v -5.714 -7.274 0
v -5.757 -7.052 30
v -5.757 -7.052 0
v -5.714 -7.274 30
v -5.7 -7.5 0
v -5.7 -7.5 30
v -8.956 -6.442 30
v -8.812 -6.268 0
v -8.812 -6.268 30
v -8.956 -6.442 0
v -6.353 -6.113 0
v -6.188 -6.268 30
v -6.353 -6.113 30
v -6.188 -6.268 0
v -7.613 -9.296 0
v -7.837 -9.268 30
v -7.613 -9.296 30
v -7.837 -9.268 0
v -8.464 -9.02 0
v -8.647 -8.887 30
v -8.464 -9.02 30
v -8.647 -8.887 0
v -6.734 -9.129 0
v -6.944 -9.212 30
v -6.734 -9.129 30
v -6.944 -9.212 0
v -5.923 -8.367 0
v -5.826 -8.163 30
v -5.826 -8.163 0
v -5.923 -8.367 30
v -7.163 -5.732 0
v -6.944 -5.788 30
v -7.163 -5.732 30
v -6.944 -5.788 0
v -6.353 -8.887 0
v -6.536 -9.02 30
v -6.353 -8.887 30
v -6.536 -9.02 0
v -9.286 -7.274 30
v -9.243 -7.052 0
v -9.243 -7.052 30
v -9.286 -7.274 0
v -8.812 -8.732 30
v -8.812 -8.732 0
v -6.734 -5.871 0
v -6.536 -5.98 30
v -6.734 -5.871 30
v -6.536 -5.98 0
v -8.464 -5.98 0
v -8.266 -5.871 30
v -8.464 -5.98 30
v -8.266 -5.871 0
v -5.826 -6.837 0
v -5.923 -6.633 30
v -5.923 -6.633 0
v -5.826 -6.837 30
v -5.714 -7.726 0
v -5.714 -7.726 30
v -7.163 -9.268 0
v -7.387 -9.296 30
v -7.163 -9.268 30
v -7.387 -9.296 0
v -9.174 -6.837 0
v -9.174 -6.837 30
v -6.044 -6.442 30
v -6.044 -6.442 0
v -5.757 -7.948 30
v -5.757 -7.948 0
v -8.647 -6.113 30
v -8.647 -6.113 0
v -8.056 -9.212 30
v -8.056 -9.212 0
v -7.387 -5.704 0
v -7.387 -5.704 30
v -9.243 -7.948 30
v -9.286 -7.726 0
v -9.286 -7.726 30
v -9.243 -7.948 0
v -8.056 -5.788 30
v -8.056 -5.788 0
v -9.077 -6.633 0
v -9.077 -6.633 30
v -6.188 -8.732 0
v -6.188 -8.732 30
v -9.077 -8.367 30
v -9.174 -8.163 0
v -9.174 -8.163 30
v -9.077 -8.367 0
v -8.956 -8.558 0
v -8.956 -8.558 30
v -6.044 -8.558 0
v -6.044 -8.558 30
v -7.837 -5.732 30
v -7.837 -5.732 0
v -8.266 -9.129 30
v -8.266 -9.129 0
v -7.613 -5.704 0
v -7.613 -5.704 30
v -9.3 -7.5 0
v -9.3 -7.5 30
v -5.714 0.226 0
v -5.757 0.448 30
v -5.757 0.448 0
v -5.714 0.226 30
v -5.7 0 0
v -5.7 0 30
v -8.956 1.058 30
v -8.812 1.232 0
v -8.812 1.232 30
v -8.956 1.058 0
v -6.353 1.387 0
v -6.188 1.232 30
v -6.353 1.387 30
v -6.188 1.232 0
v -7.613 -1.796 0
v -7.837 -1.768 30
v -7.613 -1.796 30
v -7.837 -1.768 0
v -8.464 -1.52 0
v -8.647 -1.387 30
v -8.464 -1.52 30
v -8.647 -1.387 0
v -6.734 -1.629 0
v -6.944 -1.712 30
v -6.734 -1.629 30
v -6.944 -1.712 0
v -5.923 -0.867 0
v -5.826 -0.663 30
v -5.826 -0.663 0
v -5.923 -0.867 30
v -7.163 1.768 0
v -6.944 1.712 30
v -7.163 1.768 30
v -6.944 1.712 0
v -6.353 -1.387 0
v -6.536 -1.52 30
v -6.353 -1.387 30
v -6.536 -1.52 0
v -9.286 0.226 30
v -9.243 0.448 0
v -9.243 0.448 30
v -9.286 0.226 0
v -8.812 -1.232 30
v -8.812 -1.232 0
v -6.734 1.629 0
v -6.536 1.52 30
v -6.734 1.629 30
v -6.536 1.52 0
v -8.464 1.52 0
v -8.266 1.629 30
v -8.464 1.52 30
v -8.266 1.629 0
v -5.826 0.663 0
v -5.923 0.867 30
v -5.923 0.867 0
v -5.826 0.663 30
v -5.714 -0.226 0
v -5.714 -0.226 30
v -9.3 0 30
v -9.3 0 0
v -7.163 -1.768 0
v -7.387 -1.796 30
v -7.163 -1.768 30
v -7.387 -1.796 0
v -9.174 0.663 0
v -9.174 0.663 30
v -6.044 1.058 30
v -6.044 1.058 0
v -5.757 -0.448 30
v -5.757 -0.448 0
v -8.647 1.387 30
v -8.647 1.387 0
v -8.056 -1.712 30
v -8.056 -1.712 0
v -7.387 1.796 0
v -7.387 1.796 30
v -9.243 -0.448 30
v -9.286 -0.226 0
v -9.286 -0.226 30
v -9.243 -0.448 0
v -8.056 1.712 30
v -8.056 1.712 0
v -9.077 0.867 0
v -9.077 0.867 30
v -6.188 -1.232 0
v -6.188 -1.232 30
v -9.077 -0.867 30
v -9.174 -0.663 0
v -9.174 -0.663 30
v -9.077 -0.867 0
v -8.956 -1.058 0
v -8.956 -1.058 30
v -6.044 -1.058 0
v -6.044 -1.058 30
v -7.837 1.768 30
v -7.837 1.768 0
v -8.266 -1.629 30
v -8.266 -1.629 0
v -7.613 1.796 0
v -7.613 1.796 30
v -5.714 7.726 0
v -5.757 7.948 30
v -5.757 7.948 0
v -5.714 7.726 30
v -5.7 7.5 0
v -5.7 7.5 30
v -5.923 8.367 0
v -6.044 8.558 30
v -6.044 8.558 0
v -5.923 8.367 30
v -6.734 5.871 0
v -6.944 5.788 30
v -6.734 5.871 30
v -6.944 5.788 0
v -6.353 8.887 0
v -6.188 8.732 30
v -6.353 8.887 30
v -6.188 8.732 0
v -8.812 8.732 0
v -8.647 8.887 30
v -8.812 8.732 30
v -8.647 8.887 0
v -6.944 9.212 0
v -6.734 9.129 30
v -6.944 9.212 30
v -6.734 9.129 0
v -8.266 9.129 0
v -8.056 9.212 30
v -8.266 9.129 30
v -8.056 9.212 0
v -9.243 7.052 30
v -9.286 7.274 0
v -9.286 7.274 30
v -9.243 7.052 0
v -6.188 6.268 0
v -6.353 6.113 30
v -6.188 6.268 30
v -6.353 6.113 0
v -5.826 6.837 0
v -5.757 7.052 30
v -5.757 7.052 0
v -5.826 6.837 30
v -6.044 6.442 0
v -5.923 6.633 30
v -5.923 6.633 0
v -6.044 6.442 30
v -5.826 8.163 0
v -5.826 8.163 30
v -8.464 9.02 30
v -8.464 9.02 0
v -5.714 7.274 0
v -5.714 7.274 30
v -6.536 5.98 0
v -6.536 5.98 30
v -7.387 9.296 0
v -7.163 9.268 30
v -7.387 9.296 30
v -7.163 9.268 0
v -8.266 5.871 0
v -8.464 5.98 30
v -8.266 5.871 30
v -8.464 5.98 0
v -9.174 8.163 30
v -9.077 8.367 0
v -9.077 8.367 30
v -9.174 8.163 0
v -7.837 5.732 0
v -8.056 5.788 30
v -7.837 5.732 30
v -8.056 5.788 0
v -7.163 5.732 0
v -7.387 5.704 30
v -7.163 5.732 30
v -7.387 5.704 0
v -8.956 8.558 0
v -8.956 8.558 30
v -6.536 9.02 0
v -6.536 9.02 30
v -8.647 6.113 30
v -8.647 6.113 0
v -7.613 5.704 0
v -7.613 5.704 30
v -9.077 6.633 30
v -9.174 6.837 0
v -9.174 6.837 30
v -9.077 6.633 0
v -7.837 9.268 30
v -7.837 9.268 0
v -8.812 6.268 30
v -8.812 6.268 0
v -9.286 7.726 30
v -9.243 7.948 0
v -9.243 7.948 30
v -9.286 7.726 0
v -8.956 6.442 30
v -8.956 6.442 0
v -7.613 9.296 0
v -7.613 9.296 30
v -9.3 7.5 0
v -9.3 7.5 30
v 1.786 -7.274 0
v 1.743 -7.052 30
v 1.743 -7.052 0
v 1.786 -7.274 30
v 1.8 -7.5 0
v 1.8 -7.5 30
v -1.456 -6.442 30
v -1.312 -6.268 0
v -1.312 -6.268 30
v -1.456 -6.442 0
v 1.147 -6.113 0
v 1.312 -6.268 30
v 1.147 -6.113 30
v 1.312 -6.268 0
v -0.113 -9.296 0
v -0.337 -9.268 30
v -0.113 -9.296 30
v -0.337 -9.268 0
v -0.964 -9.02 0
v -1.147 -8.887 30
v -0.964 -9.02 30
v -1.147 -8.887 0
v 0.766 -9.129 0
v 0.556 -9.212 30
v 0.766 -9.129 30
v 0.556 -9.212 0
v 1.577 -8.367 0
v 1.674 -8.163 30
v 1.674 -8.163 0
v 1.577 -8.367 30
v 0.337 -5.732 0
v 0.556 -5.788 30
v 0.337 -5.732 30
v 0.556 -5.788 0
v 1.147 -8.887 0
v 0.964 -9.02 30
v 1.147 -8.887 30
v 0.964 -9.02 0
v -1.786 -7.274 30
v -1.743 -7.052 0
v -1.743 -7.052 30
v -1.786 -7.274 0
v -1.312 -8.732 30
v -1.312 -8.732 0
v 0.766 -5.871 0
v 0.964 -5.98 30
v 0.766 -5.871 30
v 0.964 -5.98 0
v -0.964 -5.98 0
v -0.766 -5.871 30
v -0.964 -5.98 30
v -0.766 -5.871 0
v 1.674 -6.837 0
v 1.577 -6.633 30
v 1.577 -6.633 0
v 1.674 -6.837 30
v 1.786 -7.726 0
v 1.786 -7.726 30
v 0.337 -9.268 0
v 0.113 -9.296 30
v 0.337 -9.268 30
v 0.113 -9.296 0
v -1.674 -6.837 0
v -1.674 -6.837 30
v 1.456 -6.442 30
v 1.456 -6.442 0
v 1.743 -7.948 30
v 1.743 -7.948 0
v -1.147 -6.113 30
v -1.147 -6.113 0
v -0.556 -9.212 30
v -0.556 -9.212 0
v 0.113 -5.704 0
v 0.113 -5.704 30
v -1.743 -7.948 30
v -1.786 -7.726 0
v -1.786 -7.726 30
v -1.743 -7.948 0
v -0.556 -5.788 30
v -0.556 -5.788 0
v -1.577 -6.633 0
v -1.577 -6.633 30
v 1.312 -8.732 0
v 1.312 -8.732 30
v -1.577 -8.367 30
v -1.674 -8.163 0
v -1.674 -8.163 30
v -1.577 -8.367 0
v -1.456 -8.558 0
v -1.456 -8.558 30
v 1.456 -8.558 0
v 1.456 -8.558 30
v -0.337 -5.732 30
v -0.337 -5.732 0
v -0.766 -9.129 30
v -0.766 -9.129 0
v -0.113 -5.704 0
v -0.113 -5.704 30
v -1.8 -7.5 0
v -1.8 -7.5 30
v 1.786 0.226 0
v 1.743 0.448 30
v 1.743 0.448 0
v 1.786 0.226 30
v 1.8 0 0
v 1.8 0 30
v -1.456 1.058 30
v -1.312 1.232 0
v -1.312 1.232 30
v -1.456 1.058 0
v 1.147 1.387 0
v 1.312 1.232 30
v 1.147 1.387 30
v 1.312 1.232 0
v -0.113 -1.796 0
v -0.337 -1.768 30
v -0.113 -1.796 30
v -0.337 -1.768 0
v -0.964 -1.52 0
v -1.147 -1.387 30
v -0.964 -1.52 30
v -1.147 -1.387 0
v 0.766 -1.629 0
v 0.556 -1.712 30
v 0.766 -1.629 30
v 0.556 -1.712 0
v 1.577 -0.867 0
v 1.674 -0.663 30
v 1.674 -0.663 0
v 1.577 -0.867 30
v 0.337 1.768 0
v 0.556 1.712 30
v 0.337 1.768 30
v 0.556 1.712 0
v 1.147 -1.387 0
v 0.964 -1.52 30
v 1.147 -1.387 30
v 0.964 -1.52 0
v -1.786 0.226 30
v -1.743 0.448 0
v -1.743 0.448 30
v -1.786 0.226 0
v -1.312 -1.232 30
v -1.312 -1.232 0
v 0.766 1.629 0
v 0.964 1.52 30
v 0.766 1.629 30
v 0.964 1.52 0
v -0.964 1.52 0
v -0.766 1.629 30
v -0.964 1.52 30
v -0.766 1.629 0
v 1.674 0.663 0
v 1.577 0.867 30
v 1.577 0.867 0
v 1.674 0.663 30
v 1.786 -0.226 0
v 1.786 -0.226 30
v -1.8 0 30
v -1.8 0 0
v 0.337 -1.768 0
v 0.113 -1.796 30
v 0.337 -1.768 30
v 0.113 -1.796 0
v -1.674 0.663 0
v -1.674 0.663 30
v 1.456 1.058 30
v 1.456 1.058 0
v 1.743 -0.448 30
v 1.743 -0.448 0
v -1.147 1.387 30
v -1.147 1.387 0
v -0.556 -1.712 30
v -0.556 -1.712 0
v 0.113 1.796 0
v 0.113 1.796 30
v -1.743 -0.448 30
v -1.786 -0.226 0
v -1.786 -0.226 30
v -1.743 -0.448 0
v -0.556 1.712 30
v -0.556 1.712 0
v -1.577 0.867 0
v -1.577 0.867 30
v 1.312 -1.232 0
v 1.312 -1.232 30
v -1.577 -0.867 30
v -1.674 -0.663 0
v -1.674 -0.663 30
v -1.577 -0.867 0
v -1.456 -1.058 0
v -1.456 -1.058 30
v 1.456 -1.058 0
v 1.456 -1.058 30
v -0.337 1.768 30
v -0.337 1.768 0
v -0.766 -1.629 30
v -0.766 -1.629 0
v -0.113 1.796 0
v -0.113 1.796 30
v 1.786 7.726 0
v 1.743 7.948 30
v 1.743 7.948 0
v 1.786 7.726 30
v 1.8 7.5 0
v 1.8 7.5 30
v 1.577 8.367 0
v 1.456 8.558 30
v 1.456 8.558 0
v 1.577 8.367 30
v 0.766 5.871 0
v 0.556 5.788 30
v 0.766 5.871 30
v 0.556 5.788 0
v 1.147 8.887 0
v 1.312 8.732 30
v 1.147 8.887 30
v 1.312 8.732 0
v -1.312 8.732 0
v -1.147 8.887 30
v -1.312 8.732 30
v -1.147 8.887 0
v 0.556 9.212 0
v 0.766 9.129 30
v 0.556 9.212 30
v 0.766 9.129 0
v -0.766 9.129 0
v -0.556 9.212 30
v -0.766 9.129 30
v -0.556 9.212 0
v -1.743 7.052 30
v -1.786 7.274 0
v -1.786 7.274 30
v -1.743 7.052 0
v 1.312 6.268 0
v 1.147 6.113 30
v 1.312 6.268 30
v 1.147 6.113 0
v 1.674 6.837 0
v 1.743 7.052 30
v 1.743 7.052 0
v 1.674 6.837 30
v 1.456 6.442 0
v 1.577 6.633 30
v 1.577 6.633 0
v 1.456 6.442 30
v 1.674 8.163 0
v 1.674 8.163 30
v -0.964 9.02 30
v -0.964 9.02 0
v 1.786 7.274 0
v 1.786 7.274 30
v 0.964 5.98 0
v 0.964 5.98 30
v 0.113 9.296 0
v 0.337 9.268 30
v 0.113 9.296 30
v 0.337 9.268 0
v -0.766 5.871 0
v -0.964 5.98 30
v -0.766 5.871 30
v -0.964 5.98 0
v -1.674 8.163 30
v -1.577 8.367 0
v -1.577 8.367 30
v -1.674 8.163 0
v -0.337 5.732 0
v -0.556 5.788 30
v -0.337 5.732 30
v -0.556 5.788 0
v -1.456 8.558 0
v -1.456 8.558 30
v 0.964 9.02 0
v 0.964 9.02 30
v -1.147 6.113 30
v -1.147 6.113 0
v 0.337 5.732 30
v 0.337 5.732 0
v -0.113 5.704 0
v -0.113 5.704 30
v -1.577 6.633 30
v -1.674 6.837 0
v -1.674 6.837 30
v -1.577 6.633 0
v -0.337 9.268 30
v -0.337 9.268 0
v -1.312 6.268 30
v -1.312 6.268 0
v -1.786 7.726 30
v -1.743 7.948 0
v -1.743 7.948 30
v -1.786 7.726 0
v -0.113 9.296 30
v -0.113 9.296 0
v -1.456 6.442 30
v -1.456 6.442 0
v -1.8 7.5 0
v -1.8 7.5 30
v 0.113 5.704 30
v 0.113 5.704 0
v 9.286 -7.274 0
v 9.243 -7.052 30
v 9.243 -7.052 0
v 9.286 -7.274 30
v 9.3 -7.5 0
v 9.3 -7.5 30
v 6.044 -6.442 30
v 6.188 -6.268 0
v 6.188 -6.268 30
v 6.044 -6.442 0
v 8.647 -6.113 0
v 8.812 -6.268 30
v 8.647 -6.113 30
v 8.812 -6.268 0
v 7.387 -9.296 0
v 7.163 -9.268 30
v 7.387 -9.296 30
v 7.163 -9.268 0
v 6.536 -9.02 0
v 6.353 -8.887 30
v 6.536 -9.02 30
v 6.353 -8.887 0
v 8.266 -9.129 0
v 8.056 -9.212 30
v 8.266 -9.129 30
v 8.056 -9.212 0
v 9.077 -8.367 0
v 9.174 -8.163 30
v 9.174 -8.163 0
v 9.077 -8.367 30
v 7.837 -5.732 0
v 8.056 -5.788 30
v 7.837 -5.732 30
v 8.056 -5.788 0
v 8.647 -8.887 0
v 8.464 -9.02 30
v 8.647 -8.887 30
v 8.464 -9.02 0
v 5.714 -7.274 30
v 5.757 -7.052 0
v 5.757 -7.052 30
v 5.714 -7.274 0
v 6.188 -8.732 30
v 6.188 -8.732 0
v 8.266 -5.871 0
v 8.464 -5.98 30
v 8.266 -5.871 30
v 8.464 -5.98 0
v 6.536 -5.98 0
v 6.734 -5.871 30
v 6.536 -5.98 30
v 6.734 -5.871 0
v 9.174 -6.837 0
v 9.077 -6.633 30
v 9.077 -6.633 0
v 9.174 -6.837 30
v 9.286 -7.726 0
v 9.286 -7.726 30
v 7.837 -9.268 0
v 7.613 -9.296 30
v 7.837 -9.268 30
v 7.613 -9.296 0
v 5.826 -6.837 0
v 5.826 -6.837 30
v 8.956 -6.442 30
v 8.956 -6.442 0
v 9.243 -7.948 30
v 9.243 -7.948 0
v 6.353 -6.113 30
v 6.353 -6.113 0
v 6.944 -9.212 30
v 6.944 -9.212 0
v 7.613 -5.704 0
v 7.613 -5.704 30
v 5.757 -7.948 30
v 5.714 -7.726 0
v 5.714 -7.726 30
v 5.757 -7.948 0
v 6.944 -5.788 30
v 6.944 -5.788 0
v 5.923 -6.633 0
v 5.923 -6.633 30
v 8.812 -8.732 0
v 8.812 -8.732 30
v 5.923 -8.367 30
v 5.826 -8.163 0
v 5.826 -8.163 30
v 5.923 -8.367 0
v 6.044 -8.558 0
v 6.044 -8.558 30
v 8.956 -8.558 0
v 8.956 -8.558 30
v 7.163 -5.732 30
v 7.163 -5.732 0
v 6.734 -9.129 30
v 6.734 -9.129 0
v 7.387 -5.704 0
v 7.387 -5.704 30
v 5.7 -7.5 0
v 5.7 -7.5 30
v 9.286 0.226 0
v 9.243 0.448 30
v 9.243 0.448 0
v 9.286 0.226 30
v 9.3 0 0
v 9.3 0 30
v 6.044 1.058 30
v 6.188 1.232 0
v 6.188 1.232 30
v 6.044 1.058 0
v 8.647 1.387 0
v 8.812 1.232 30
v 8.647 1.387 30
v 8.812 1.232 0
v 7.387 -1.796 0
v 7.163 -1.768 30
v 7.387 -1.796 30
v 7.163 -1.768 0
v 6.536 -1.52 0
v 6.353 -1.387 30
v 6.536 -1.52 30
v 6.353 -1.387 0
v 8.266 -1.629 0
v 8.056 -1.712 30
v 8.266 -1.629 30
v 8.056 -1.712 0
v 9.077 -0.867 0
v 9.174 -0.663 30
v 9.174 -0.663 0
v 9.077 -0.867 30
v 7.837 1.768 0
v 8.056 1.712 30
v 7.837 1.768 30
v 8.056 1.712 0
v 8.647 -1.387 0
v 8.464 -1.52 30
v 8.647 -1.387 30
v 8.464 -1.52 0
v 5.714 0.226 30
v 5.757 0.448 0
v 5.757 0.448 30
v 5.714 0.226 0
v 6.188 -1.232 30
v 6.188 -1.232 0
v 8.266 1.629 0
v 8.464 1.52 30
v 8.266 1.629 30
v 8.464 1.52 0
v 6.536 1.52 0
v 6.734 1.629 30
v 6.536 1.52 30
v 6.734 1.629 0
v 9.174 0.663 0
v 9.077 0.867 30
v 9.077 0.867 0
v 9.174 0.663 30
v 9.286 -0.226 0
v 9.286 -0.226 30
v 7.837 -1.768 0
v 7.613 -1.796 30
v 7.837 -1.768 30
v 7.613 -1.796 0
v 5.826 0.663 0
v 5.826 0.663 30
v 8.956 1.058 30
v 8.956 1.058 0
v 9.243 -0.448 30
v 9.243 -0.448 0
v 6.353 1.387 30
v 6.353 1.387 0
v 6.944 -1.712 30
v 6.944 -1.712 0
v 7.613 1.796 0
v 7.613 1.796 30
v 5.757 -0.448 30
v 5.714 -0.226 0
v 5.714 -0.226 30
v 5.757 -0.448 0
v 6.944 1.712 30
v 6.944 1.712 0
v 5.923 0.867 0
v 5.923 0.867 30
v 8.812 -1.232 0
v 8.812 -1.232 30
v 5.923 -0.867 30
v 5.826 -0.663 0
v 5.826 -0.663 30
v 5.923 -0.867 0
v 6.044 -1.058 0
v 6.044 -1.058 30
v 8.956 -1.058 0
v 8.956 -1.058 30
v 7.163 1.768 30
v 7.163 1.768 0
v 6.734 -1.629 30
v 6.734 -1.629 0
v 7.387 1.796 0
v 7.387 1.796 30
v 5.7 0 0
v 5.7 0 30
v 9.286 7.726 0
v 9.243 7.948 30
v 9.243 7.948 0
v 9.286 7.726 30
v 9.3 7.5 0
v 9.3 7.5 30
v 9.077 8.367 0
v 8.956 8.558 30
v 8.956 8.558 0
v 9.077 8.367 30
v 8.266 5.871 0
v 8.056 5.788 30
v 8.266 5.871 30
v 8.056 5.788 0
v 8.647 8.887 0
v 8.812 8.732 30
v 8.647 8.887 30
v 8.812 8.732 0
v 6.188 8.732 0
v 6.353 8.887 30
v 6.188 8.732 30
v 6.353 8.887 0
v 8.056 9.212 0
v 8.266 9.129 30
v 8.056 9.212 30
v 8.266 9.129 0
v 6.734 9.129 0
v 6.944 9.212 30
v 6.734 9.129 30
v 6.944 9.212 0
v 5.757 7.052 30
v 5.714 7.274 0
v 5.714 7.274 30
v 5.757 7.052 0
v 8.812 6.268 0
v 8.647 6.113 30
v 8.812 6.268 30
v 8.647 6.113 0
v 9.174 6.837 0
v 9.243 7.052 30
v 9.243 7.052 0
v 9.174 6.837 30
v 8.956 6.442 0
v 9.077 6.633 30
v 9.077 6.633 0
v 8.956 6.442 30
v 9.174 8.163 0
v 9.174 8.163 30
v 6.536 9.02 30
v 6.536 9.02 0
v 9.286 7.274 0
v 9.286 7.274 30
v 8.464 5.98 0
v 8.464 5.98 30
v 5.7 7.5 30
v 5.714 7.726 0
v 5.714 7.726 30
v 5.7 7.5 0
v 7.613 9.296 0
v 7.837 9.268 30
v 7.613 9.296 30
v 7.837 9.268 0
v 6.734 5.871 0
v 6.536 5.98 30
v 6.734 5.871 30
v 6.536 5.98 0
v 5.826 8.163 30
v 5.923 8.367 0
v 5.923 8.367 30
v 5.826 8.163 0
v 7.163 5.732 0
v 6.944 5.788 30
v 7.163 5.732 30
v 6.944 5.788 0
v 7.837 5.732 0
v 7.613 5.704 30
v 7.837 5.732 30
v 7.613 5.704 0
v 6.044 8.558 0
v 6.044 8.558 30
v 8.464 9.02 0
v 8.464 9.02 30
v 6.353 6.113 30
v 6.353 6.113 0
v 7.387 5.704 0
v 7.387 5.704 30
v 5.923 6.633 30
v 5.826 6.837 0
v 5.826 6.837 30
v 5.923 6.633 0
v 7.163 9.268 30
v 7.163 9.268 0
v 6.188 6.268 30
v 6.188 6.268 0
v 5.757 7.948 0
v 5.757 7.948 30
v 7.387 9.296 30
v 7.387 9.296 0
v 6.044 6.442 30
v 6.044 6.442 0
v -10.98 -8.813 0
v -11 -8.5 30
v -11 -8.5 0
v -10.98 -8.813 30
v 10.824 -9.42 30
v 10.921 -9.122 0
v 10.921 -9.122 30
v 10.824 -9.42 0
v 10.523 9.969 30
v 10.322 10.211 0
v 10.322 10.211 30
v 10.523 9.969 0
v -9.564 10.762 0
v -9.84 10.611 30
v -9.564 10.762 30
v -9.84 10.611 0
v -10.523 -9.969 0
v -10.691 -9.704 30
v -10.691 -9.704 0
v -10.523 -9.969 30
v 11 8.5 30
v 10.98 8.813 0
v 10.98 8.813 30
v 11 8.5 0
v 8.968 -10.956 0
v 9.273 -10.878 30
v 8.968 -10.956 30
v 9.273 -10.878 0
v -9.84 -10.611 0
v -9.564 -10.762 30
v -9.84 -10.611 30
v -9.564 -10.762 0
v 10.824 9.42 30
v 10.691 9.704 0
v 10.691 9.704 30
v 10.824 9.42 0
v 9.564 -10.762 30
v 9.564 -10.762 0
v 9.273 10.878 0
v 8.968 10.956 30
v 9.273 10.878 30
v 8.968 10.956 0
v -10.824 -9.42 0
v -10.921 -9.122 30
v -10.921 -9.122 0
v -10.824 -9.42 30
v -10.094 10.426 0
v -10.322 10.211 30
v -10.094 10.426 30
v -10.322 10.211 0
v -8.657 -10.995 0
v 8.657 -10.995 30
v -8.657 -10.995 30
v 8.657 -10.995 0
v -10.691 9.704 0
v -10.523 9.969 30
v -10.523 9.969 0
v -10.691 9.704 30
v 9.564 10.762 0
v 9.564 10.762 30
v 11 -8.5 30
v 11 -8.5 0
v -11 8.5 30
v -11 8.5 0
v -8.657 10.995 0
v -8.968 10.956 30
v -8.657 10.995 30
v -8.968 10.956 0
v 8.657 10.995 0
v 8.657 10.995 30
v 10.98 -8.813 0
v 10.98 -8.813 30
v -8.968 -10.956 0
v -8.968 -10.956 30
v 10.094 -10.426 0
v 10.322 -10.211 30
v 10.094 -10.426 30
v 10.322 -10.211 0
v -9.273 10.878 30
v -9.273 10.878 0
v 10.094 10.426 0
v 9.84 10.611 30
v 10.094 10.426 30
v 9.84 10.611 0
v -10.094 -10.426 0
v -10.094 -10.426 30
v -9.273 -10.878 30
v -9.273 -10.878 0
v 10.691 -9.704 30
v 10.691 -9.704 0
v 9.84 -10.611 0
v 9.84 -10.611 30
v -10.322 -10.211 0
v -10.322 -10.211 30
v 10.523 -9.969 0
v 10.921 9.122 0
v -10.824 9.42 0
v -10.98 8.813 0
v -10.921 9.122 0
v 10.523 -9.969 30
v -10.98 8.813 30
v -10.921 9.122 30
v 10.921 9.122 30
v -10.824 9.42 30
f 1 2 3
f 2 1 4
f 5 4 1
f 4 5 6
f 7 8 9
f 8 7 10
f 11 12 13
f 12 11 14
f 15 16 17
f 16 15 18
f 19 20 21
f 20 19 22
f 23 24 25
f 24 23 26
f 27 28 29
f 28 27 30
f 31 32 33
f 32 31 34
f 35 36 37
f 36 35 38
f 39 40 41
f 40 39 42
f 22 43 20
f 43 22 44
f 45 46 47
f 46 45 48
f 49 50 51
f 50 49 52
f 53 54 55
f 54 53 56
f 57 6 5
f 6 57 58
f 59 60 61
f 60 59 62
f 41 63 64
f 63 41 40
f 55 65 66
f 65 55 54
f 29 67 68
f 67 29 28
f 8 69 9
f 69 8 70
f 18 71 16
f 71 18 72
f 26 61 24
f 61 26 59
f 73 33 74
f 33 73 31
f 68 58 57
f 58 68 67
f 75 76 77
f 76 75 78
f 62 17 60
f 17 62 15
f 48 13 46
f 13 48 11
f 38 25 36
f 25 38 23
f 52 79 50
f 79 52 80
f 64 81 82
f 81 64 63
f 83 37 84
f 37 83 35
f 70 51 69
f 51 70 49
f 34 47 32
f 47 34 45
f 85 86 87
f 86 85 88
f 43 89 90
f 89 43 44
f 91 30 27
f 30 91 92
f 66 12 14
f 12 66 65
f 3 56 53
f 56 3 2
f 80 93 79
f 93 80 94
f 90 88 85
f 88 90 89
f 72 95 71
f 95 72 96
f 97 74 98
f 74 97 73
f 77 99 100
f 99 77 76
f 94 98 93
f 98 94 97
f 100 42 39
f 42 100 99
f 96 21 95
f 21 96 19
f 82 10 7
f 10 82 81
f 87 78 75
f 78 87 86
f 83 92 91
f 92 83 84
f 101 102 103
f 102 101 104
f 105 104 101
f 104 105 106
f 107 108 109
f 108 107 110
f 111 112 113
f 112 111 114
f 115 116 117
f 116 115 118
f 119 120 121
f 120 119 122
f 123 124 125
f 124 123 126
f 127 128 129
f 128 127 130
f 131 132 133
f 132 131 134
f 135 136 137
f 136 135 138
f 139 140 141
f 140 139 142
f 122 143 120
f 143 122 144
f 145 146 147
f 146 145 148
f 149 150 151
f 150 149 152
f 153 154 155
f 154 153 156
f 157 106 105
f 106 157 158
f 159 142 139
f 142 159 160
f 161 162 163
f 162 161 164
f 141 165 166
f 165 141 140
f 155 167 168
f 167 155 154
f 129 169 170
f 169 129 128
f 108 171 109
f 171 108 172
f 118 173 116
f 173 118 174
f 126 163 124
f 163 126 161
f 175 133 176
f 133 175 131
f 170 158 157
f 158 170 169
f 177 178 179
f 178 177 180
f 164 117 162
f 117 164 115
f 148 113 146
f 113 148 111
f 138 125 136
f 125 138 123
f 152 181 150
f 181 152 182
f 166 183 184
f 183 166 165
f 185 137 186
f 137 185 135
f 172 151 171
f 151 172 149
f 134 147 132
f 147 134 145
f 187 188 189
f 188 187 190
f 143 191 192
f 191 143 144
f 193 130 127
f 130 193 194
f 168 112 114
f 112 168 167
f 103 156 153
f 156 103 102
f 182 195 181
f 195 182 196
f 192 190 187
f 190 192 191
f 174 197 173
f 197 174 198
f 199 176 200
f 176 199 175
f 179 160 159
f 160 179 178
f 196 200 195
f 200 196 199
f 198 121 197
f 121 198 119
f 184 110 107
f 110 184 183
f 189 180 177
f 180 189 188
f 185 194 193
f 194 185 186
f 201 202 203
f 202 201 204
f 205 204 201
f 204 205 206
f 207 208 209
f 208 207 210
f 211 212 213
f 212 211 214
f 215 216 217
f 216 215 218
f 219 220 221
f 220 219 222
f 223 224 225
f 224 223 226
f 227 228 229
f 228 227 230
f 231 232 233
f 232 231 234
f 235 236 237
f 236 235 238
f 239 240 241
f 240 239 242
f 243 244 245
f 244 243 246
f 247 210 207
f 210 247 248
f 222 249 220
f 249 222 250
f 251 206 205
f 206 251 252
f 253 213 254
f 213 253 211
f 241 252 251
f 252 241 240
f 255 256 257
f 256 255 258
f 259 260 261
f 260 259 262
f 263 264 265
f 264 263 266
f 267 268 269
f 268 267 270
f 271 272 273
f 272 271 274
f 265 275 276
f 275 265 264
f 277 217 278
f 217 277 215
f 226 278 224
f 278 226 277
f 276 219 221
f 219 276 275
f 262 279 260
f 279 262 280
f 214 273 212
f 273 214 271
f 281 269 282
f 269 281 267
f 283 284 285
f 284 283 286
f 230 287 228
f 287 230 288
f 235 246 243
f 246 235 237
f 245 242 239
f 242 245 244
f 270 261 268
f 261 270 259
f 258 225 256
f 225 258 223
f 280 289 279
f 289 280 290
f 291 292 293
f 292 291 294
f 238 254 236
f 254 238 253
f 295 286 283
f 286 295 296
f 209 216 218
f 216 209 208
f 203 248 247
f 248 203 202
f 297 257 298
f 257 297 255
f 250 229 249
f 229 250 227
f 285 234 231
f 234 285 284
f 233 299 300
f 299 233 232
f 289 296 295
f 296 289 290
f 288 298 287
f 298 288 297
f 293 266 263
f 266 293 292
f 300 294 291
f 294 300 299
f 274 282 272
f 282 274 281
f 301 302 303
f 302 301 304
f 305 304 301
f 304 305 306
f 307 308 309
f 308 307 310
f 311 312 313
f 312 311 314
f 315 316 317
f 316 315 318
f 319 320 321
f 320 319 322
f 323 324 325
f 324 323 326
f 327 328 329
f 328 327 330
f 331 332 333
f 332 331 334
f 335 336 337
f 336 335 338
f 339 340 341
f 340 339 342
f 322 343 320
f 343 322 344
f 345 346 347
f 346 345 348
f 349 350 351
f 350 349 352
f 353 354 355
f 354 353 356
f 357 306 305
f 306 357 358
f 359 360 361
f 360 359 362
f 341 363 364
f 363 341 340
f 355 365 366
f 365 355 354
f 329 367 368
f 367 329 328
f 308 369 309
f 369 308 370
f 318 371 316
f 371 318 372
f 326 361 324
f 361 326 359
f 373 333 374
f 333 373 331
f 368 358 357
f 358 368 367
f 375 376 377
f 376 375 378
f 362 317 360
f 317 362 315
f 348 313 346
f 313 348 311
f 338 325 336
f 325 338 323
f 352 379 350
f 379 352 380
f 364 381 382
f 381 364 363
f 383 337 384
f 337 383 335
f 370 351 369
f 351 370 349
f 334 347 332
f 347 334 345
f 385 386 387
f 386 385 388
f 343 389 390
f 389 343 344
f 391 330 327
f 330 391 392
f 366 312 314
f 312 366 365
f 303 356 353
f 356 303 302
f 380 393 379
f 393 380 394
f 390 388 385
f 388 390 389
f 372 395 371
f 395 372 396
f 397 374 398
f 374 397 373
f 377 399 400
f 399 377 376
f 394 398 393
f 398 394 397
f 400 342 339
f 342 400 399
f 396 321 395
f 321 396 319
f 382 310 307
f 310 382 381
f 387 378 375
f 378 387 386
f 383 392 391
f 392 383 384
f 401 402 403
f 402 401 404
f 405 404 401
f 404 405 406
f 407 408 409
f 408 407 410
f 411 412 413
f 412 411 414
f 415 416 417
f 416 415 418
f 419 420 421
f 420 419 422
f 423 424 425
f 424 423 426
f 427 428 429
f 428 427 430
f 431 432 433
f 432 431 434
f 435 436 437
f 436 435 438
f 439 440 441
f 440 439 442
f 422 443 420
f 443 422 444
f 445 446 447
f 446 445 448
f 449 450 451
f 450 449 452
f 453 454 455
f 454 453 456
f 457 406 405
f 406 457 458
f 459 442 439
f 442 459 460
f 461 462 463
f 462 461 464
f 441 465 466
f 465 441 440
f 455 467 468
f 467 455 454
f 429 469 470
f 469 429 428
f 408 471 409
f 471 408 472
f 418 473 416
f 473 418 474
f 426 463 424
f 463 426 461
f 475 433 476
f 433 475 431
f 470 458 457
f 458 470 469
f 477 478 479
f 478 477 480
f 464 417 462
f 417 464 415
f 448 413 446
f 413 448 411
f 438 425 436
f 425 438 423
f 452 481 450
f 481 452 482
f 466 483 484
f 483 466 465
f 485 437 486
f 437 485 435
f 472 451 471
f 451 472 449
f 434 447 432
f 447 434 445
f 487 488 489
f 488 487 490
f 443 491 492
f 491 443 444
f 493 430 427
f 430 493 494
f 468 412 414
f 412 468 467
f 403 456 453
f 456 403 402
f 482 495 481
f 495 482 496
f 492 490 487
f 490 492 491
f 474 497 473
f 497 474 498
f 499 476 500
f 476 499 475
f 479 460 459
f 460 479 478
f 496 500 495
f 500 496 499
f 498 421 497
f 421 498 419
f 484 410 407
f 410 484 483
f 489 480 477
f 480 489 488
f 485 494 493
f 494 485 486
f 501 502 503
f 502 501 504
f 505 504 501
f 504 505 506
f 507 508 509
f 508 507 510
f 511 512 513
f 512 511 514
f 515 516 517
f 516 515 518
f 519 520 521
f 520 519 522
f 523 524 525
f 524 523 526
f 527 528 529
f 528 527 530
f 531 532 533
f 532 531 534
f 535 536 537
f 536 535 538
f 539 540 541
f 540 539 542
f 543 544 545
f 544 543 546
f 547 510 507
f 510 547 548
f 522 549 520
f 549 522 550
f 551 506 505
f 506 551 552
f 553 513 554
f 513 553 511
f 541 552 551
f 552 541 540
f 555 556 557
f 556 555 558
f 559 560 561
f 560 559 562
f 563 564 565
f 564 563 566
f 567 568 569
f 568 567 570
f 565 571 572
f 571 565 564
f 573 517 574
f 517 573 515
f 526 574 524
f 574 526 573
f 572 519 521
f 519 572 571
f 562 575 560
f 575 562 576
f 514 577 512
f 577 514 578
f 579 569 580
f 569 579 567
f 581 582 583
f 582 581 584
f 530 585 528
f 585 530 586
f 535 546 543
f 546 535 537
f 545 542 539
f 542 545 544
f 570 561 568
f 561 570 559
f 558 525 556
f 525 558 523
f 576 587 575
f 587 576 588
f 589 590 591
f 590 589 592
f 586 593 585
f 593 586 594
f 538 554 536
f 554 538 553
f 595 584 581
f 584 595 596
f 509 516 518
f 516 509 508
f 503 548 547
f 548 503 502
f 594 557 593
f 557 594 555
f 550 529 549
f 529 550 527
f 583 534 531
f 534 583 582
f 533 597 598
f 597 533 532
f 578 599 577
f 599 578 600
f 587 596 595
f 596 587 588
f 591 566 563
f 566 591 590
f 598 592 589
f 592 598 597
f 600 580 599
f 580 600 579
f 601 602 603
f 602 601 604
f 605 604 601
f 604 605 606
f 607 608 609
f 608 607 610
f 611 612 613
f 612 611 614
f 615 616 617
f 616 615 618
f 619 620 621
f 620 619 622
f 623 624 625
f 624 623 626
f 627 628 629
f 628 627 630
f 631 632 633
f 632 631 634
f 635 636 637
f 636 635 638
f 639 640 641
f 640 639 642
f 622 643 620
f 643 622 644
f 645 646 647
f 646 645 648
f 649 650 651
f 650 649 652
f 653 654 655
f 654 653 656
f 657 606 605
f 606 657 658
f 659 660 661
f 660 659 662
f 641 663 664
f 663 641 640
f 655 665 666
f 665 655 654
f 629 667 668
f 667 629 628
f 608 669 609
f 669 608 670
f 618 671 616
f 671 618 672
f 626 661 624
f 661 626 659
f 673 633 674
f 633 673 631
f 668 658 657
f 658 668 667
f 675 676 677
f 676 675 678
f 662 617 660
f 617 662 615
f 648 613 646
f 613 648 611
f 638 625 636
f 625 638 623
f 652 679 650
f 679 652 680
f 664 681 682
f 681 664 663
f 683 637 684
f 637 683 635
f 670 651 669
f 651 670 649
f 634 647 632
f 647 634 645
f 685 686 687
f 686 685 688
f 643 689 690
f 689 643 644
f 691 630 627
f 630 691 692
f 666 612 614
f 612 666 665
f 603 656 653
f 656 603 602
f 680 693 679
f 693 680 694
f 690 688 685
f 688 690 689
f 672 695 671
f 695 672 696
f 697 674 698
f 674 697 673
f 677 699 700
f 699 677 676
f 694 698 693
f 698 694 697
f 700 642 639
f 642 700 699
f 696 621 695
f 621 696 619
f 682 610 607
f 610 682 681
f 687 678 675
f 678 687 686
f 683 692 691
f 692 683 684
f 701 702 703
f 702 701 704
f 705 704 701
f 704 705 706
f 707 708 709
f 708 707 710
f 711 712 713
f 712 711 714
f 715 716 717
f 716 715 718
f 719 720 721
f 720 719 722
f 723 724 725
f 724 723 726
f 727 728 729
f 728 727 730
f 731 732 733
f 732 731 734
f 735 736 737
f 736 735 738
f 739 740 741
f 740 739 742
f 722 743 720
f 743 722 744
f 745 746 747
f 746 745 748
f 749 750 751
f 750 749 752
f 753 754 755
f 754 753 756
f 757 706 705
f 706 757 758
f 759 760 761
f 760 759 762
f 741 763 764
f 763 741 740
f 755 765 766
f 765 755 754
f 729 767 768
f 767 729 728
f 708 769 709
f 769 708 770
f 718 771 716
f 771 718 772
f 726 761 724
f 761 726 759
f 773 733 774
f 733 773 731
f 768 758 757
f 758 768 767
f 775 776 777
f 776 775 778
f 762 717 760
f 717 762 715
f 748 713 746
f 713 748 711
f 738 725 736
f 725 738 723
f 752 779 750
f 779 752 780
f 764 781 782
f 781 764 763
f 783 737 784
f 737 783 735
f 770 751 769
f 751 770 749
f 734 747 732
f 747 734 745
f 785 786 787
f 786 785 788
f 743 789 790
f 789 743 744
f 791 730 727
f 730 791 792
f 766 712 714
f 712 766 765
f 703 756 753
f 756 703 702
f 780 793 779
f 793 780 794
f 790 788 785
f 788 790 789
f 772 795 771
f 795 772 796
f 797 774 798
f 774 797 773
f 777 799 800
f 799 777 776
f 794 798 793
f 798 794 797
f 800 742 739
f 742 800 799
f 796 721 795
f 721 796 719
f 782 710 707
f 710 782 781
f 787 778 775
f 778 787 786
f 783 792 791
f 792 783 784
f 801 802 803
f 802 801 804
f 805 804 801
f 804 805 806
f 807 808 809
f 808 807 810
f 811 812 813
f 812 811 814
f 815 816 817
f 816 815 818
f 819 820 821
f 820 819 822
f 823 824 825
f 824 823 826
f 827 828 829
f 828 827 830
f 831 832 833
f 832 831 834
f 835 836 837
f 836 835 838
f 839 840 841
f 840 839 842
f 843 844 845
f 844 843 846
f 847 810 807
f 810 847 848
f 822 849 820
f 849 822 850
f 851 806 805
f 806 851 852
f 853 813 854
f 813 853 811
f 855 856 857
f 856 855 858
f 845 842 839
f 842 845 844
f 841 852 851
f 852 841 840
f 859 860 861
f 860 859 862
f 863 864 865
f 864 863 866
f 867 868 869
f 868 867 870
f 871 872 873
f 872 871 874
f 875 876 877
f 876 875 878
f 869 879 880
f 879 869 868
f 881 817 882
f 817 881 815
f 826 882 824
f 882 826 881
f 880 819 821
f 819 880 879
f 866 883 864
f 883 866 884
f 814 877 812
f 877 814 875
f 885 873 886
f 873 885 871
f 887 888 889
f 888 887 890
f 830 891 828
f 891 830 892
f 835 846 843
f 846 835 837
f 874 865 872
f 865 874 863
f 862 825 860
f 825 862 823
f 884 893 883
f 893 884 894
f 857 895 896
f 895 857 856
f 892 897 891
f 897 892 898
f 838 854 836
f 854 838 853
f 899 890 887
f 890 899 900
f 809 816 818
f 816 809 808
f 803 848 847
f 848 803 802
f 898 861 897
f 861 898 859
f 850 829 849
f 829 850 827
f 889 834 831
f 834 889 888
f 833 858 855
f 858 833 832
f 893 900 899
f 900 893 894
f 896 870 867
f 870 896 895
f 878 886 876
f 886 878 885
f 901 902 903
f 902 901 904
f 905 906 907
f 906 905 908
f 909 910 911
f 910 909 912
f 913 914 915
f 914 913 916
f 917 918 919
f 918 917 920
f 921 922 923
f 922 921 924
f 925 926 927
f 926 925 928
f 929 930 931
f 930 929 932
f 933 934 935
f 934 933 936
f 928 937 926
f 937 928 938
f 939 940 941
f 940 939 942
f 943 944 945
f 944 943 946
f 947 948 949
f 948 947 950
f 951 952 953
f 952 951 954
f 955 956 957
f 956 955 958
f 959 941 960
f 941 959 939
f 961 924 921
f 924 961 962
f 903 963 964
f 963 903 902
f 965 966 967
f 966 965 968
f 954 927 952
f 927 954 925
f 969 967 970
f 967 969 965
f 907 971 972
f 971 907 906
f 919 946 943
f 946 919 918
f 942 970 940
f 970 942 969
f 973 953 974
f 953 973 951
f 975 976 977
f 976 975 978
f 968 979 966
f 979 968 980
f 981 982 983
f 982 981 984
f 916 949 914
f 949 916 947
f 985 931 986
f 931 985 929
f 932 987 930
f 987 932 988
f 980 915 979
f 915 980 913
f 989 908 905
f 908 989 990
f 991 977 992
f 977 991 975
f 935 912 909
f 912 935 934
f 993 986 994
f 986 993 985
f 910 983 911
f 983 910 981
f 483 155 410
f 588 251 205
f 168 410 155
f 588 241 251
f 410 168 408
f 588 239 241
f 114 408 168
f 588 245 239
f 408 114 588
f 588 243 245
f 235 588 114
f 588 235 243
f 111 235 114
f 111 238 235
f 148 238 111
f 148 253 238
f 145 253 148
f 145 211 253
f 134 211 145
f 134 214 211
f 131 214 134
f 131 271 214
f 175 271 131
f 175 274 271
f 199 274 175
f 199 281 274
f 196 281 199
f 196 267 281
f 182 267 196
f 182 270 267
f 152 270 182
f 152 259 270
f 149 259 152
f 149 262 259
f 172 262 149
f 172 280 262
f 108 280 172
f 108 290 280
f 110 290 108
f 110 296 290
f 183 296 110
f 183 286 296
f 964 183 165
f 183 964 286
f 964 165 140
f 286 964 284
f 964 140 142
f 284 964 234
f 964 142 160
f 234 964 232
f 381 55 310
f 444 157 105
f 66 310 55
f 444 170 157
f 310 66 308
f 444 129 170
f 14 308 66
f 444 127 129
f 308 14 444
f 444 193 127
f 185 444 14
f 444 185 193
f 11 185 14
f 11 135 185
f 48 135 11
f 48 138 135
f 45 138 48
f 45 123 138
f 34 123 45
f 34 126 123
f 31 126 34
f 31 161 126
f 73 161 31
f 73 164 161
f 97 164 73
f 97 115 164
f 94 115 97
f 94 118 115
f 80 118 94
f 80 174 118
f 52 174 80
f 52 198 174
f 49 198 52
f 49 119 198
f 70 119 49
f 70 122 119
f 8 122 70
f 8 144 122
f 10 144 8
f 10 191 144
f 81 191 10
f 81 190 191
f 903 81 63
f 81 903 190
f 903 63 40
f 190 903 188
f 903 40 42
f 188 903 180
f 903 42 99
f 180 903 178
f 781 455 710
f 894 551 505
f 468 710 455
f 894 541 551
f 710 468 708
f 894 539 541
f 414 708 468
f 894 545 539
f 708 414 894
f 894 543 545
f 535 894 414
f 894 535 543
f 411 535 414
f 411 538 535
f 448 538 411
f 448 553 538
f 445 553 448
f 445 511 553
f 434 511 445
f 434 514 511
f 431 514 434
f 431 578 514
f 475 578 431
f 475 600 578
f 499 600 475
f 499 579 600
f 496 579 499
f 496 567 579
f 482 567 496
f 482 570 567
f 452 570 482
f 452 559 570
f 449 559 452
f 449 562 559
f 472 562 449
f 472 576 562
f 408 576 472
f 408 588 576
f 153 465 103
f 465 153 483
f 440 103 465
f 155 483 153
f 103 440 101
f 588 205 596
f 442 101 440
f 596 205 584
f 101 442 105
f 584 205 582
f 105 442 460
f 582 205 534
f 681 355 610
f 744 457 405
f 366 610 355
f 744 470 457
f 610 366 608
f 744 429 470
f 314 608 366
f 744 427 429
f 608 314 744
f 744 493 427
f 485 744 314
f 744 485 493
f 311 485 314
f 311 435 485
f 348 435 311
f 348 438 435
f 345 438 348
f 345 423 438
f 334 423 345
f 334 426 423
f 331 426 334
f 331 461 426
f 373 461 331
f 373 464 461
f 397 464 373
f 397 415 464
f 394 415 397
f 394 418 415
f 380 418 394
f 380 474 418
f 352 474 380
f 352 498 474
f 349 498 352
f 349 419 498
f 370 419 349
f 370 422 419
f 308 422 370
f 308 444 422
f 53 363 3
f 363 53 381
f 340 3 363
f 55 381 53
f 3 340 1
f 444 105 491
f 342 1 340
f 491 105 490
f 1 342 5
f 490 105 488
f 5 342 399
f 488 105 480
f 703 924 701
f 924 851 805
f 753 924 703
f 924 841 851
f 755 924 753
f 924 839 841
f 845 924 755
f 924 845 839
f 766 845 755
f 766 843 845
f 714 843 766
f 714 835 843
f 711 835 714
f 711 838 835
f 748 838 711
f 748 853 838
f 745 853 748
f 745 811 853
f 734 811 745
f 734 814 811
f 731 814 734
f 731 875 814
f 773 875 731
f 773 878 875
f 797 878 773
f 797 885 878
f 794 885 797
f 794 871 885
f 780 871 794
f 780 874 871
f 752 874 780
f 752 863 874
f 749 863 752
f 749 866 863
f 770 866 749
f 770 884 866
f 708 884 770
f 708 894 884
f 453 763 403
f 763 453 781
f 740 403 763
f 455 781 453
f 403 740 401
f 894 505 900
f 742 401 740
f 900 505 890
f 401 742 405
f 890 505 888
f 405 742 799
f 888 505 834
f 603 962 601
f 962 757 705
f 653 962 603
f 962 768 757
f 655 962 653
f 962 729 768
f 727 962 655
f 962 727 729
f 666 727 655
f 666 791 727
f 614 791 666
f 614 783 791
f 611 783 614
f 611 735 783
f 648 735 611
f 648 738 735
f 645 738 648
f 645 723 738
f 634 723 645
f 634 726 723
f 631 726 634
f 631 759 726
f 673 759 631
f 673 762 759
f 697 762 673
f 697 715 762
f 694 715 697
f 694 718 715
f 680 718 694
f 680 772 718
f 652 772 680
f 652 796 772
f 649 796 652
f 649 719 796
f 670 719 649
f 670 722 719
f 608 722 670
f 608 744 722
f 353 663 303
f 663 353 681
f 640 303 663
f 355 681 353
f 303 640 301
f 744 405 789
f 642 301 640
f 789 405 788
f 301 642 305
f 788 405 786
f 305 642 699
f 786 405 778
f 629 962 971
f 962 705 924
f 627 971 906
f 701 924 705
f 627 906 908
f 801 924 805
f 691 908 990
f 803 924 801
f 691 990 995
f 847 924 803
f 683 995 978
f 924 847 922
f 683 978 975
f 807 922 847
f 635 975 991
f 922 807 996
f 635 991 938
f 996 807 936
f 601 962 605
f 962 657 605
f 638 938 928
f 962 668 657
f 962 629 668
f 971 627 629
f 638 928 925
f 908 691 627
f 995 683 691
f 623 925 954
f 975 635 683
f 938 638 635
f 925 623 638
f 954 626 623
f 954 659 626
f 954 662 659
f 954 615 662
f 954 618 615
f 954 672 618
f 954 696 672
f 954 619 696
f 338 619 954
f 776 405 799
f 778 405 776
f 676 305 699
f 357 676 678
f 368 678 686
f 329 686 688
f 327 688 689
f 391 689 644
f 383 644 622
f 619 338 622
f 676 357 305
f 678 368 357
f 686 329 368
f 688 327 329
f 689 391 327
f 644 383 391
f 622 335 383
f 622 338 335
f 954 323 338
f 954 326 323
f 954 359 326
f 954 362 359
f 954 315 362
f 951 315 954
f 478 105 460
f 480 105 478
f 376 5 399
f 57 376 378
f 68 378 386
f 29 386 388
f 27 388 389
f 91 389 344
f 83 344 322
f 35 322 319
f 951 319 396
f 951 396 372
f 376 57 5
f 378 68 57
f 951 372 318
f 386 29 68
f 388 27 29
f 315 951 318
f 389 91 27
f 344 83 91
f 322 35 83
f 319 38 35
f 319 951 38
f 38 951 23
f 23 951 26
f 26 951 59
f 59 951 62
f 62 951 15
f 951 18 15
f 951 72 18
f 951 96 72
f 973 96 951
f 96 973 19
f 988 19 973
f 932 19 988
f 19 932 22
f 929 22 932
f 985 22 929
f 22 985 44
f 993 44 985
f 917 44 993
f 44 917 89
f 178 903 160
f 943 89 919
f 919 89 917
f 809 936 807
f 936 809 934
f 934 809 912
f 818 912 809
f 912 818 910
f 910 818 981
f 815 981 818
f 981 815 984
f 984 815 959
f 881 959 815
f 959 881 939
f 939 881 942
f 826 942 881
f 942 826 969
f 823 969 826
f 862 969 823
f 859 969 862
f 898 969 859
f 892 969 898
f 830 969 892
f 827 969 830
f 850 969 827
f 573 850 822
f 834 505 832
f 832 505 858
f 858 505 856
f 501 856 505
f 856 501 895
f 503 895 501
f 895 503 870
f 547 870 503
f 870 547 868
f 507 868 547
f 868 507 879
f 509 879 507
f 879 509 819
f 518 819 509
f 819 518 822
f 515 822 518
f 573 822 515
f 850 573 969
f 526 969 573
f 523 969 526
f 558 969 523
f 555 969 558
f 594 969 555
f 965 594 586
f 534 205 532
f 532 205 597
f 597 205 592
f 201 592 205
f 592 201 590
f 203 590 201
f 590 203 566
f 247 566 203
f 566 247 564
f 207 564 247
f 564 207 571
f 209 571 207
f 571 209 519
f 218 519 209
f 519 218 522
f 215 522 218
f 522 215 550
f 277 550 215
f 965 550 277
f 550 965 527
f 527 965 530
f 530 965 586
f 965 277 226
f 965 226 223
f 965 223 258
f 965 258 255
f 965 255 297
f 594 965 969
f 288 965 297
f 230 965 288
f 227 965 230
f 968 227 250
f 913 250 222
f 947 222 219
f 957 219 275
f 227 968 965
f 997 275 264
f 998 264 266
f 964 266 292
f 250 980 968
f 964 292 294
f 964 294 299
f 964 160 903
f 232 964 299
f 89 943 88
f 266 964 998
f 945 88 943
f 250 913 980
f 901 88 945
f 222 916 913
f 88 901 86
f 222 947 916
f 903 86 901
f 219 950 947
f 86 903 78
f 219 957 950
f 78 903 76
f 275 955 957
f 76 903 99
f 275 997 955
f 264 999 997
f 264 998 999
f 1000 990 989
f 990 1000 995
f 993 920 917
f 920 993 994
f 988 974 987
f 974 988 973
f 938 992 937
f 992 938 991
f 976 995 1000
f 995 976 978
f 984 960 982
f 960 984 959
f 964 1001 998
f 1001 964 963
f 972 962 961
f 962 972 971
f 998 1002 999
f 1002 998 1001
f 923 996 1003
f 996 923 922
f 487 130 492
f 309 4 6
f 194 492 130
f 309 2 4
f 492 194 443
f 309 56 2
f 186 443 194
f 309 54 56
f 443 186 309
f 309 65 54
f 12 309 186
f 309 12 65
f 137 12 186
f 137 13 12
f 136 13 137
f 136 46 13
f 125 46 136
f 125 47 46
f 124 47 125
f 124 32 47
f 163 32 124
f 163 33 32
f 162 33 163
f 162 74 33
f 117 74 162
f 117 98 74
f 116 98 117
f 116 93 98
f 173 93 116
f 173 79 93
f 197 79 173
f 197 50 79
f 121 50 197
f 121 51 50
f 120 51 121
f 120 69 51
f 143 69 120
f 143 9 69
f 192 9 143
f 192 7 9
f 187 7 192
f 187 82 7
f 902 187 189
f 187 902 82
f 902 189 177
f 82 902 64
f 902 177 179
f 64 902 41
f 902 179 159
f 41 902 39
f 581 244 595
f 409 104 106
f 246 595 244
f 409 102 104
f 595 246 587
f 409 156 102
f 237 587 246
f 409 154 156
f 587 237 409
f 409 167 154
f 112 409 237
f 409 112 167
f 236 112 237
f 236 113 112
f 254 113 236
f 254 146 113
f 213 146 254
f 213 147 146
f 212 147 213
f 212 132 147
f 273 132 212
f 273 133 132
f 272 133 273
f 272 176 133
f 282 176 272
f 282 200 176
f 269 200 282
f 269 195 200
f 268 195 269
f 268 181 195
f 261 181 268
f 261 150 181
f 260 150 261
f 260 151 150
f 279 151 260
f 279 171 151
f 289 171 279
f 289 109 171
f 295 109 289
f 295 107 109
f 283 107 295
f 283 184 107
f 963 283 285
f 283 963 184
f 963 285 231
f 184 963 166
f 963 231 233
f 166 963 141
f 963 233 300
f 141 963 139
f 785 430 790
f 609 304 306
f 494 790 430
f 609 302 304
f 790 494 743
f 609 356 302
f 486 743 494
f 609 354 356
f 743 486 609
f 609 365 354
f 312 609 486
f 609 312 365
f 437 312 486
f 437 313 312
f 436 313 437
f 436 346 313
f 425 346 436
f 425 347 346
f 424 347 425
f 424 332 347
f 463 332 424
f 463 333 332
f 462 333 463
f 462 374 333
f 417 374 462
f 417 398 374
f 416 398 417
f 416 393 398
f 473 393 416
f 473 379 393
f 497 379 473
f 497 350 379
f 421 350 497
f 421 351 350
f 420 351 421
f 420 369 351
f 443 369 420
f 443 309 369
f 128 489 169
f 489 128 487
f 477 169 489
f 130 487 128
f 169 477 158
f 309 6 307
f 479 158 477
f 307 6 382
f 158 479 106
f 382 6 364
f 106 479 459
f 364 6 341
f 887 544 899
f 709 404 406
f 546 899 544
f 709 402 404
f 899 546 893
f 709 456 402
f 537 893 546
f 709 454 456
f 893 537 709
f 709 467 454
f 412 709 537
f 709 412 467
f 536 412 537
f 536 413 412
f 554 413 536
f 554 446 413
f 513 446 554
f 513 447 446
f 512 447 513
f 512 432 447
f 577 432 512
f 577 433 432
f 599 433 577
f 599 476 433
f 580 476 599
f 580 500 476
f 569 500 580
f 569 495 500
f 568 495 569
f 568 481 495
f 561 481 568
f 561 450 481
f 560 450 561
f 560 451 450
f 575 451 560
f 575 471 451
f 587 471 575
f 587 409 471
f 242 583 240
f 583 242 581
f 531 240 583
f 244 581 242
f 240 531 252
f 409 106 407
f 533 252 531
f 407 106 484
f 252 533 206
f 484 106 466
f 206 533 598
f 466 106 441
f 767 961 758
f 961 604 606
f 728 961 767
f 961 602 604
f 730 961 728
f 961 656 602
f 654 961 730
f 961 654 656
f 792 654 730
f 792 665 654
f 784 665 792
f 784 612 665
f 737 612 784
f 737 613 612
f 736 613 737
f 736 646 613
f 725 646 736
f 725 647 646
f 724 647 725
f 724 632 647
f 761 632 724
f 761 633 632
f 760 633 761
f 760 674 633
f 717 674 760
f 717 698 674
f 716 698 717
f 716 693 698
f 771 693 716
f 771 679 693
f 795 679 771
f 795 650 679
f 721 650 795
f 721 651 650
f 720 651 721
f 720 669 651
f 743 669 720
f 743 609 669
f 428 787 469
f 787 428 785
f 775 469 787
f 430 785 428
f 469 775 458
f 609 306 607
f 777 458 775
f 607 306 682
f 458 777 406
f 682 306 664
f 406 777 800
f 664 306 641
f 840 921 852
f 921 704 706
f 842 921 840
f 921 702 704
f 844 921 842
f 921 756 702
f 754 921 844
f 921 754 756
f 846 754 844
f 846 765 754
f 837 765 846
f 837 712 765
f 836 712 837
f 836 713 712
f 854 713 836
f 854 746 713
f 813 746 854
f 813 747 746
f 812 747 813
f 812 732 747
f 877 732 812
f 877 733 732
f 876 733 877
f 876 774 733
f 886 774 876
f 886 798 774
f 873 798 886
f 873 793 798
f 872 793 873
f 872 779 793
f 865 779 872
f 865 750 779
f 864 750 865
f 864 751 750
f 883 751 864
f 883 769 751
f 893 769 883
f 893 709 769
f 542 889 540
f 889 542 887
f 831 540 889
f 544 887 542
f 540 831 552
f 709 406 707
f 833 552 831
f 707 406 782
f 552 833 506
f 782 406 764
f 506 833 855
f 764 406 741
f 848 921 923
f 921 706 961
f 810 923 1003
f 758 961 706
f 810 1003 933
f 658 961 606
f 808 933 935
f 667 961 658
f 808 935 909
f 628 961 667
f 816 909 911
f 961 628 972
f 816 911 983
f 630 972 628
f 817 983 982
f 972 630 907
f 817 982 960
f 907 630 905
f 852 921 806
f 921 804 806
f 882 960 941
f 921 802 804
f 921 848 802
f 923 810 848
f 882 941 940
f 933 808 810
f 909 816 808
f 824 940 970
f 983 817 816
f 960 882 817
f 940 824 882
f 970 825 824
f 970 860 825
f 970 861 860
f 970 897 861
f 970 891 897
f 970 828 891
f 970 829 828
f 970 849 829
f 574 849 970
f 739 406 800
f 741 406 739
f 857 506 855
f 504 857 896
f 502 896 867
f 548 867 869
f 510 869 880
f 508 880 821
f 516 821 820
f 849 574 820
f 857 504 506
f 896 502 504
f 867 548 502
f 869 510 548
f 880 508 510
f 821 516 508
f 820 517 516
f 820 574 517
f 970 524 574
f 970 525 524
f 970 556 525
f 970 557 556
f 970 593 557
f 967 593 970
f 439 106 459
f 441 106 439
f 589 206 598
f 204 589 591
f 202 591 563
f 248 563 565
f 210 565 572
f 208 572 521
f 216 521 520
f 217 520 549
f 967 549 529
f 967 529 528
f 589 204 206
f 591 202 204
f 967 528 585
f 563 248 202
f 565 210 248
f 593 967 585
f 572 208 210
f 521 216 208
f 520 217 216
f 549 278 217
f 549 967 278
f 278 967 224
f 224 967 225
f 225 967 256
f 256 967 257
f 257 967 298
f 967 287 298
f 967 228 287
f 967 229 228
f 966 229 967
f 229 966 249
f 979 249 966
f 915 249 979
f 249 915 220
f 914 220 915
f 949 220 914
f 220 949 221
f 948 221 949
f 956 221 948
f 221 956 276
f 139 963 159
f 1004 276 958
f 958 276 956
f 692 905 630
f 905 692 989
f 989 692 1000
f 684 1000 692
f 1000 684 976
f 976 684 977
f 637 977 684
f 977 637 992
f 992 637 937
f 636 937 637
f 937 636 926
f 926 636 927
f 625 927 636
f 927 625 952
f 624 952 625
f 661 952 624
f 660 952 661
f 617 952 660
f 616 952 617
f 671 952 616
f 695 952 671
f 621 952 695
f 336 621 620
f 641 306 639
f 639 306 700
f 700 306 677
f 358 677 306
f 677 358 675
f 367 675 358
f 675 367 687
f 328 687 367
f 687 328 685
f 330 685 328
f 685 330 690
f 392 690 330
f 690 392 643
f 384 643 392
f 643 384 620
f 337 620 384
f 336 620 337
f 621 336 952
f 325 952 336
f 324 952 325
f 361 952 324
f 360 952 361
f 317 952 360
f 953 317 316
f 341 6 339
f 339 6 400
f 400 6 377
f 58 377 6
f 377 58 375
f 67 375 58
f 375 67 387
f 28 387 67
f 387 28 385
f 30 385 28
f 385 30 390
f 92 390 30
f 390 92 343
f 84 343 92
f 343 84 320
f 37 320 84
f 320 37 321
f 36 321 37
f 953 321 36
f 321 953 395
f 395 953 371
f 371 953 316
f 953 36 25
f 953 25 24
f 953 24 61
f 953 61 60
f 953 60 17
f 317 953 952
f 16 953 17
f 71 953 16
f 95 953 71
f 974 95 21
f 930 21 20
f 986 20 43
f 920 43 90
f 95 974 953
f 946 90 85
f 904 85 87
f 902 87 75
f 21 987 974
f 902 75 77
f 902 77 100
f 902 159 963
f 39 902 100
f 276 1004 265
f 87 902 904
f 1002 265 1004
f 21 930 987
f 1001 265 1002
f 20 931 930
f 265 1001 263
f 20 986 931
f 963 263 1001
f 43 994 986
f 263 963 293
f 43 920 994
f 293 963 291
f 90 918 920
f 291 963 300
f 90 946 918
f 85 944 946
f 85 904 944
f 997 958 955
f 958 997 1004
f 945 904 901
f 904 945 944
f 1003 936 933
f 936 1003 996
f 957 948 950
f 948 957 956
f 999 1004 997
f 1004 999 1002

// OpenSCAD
$fn = 50;


difference() {
	union() {
		translate(v = [0, 0, 0]) {
			rotate(a = [0, 0, 0]) {
				hull() {
					translate(v = [-8.5000000000, 8.5000000000, 0]) {
						rotate(a = [0, 0, 0]) {
							translate(v = [0, 0, 0]) {
								rotate(a = [0, 0, 0]) {
									cylinder(h = 30, r = 2.5000000000);
								}
							}
						}
					}
					translate(v = [8.5000000000, 8.5000000000, 0]) {
						rotate(a = [0, 0, 0]) {
							translate(v = [0, 0, 0]) {
								rotate(a = [0, 0, 0]) {
									cylinder(h = 30, r = 2.5000000000);
								}
							}
						}
					}
					translate(v = [-8.5000000000, -8.5000000000, 0]) {
						rotate(a = [0, 0, 0]) {
							translate(v = [0, 0, 0]) {
								rotate(a = [0, 0, 0]) {
									cylinder(h = 30, r = 2.5000000000);
								}
							}
						}
					}
					translate(v = [8.5000000000, -8.5000000000, 0]) {
						rotate(a = [0, 0, 0]) {
							translate(v = [0, 0, 0]) {
								rotate(a = [0, 0, 0]) {
									cylinder(h = 30, r = 2.5000000000);
								}
							}
						}
					}
				}
			}
		}
	}
	union() {
		translate(v = [-7.5000000000, -7.5000000000, 0]) {
			rotate(a = [0, 0, 0]) {
				translate(v = [0, 0, -50]) {
					rotate(a = [0, 0, 0]) {
						cylinder(h = 100, r = 1.8000000000);
					}
				}
			}
		}
		translate(v = [-7.5000000000, 0.0000000000, 0]) {
			rotate(a = [0, 0, 0]) {
				translate(v = [0, 0, -50]) {
					rotate(a = [0, 0, 0]) {
						cylinder(h = 100, r = 1.8000000000);
					}
				}
			}
		}
		translate(v = [-7.5000000000, 7.5000000000, 0]) {
			rotate(a = [0, 0, 0]) {
				translate(v = [0, 0, -50]) {
					rotate(a = [0, 0, 0]) {
						cylinder(h = 100, r = 1.8000000000);
					}
				}
			}
		}
		translate(v = [0.0000000000, -7.5000000000, 0]) {
			rotate(a = [0, 0, 0]) {
				translate(v = [0, 0, -50]) {
					rotate(a = [0, 0, 0]) {
						cylinder(h = 100, r = 1.8000000000);
					}
				}
			}
		}
		translate(v = [0.0000000000, 0.0000000000, 0]) {
			rotate(a = [0, 0, 0]) {
				translate(v = [0, 0, -50]) {
					rotate(a = [0, 0, 0]) {
						cylinder(h = 100, r = 1.8000000000);
					}
				}
			}
		}
		translate(v = [0.0000000000, 7.5000000000, 0]) {
			rotate(a = [0, 0, 0]) {
				translate(v = [0, 0, -50]) {
					rotate(a = [0, 0, 0]) {
						cylinder(h = 100, r = 1.8000000000);
					}
				}
			}
		}
		translate(v = [7.5000000000, -7.5000000000, 0]) {
			rotate(a = [0, 0, 0]) {
				translate(v = [0, 0, -50]) {
					rotate(a = [0, 0, 0]) {
						cylinder(h = 100, r = 1.8000000000);
					}
				}
			}
		}
		translate(v = [7.5000000000, 0.0000000000, 0]) {
			rotate(a = [0, 0, 0]) {
				translate(v = [0, 0, -50]) {
					rotate(a = [0, 0, 0]) {
						cylinder(h = 100, r = 1.8000000000);
					}
				}
			}
		}
		translate(v = [7.5000000000, 7.5000000000, 0]) {
			rotate(a = [0, 0, 0]) {
				translate(v = [0, 0, -50]) {
					rotate(a = [0, 0, 0]) {
						cylinder(h = 100, r = 1.8000000000);
					}
				}
			}
		}
	}
}
